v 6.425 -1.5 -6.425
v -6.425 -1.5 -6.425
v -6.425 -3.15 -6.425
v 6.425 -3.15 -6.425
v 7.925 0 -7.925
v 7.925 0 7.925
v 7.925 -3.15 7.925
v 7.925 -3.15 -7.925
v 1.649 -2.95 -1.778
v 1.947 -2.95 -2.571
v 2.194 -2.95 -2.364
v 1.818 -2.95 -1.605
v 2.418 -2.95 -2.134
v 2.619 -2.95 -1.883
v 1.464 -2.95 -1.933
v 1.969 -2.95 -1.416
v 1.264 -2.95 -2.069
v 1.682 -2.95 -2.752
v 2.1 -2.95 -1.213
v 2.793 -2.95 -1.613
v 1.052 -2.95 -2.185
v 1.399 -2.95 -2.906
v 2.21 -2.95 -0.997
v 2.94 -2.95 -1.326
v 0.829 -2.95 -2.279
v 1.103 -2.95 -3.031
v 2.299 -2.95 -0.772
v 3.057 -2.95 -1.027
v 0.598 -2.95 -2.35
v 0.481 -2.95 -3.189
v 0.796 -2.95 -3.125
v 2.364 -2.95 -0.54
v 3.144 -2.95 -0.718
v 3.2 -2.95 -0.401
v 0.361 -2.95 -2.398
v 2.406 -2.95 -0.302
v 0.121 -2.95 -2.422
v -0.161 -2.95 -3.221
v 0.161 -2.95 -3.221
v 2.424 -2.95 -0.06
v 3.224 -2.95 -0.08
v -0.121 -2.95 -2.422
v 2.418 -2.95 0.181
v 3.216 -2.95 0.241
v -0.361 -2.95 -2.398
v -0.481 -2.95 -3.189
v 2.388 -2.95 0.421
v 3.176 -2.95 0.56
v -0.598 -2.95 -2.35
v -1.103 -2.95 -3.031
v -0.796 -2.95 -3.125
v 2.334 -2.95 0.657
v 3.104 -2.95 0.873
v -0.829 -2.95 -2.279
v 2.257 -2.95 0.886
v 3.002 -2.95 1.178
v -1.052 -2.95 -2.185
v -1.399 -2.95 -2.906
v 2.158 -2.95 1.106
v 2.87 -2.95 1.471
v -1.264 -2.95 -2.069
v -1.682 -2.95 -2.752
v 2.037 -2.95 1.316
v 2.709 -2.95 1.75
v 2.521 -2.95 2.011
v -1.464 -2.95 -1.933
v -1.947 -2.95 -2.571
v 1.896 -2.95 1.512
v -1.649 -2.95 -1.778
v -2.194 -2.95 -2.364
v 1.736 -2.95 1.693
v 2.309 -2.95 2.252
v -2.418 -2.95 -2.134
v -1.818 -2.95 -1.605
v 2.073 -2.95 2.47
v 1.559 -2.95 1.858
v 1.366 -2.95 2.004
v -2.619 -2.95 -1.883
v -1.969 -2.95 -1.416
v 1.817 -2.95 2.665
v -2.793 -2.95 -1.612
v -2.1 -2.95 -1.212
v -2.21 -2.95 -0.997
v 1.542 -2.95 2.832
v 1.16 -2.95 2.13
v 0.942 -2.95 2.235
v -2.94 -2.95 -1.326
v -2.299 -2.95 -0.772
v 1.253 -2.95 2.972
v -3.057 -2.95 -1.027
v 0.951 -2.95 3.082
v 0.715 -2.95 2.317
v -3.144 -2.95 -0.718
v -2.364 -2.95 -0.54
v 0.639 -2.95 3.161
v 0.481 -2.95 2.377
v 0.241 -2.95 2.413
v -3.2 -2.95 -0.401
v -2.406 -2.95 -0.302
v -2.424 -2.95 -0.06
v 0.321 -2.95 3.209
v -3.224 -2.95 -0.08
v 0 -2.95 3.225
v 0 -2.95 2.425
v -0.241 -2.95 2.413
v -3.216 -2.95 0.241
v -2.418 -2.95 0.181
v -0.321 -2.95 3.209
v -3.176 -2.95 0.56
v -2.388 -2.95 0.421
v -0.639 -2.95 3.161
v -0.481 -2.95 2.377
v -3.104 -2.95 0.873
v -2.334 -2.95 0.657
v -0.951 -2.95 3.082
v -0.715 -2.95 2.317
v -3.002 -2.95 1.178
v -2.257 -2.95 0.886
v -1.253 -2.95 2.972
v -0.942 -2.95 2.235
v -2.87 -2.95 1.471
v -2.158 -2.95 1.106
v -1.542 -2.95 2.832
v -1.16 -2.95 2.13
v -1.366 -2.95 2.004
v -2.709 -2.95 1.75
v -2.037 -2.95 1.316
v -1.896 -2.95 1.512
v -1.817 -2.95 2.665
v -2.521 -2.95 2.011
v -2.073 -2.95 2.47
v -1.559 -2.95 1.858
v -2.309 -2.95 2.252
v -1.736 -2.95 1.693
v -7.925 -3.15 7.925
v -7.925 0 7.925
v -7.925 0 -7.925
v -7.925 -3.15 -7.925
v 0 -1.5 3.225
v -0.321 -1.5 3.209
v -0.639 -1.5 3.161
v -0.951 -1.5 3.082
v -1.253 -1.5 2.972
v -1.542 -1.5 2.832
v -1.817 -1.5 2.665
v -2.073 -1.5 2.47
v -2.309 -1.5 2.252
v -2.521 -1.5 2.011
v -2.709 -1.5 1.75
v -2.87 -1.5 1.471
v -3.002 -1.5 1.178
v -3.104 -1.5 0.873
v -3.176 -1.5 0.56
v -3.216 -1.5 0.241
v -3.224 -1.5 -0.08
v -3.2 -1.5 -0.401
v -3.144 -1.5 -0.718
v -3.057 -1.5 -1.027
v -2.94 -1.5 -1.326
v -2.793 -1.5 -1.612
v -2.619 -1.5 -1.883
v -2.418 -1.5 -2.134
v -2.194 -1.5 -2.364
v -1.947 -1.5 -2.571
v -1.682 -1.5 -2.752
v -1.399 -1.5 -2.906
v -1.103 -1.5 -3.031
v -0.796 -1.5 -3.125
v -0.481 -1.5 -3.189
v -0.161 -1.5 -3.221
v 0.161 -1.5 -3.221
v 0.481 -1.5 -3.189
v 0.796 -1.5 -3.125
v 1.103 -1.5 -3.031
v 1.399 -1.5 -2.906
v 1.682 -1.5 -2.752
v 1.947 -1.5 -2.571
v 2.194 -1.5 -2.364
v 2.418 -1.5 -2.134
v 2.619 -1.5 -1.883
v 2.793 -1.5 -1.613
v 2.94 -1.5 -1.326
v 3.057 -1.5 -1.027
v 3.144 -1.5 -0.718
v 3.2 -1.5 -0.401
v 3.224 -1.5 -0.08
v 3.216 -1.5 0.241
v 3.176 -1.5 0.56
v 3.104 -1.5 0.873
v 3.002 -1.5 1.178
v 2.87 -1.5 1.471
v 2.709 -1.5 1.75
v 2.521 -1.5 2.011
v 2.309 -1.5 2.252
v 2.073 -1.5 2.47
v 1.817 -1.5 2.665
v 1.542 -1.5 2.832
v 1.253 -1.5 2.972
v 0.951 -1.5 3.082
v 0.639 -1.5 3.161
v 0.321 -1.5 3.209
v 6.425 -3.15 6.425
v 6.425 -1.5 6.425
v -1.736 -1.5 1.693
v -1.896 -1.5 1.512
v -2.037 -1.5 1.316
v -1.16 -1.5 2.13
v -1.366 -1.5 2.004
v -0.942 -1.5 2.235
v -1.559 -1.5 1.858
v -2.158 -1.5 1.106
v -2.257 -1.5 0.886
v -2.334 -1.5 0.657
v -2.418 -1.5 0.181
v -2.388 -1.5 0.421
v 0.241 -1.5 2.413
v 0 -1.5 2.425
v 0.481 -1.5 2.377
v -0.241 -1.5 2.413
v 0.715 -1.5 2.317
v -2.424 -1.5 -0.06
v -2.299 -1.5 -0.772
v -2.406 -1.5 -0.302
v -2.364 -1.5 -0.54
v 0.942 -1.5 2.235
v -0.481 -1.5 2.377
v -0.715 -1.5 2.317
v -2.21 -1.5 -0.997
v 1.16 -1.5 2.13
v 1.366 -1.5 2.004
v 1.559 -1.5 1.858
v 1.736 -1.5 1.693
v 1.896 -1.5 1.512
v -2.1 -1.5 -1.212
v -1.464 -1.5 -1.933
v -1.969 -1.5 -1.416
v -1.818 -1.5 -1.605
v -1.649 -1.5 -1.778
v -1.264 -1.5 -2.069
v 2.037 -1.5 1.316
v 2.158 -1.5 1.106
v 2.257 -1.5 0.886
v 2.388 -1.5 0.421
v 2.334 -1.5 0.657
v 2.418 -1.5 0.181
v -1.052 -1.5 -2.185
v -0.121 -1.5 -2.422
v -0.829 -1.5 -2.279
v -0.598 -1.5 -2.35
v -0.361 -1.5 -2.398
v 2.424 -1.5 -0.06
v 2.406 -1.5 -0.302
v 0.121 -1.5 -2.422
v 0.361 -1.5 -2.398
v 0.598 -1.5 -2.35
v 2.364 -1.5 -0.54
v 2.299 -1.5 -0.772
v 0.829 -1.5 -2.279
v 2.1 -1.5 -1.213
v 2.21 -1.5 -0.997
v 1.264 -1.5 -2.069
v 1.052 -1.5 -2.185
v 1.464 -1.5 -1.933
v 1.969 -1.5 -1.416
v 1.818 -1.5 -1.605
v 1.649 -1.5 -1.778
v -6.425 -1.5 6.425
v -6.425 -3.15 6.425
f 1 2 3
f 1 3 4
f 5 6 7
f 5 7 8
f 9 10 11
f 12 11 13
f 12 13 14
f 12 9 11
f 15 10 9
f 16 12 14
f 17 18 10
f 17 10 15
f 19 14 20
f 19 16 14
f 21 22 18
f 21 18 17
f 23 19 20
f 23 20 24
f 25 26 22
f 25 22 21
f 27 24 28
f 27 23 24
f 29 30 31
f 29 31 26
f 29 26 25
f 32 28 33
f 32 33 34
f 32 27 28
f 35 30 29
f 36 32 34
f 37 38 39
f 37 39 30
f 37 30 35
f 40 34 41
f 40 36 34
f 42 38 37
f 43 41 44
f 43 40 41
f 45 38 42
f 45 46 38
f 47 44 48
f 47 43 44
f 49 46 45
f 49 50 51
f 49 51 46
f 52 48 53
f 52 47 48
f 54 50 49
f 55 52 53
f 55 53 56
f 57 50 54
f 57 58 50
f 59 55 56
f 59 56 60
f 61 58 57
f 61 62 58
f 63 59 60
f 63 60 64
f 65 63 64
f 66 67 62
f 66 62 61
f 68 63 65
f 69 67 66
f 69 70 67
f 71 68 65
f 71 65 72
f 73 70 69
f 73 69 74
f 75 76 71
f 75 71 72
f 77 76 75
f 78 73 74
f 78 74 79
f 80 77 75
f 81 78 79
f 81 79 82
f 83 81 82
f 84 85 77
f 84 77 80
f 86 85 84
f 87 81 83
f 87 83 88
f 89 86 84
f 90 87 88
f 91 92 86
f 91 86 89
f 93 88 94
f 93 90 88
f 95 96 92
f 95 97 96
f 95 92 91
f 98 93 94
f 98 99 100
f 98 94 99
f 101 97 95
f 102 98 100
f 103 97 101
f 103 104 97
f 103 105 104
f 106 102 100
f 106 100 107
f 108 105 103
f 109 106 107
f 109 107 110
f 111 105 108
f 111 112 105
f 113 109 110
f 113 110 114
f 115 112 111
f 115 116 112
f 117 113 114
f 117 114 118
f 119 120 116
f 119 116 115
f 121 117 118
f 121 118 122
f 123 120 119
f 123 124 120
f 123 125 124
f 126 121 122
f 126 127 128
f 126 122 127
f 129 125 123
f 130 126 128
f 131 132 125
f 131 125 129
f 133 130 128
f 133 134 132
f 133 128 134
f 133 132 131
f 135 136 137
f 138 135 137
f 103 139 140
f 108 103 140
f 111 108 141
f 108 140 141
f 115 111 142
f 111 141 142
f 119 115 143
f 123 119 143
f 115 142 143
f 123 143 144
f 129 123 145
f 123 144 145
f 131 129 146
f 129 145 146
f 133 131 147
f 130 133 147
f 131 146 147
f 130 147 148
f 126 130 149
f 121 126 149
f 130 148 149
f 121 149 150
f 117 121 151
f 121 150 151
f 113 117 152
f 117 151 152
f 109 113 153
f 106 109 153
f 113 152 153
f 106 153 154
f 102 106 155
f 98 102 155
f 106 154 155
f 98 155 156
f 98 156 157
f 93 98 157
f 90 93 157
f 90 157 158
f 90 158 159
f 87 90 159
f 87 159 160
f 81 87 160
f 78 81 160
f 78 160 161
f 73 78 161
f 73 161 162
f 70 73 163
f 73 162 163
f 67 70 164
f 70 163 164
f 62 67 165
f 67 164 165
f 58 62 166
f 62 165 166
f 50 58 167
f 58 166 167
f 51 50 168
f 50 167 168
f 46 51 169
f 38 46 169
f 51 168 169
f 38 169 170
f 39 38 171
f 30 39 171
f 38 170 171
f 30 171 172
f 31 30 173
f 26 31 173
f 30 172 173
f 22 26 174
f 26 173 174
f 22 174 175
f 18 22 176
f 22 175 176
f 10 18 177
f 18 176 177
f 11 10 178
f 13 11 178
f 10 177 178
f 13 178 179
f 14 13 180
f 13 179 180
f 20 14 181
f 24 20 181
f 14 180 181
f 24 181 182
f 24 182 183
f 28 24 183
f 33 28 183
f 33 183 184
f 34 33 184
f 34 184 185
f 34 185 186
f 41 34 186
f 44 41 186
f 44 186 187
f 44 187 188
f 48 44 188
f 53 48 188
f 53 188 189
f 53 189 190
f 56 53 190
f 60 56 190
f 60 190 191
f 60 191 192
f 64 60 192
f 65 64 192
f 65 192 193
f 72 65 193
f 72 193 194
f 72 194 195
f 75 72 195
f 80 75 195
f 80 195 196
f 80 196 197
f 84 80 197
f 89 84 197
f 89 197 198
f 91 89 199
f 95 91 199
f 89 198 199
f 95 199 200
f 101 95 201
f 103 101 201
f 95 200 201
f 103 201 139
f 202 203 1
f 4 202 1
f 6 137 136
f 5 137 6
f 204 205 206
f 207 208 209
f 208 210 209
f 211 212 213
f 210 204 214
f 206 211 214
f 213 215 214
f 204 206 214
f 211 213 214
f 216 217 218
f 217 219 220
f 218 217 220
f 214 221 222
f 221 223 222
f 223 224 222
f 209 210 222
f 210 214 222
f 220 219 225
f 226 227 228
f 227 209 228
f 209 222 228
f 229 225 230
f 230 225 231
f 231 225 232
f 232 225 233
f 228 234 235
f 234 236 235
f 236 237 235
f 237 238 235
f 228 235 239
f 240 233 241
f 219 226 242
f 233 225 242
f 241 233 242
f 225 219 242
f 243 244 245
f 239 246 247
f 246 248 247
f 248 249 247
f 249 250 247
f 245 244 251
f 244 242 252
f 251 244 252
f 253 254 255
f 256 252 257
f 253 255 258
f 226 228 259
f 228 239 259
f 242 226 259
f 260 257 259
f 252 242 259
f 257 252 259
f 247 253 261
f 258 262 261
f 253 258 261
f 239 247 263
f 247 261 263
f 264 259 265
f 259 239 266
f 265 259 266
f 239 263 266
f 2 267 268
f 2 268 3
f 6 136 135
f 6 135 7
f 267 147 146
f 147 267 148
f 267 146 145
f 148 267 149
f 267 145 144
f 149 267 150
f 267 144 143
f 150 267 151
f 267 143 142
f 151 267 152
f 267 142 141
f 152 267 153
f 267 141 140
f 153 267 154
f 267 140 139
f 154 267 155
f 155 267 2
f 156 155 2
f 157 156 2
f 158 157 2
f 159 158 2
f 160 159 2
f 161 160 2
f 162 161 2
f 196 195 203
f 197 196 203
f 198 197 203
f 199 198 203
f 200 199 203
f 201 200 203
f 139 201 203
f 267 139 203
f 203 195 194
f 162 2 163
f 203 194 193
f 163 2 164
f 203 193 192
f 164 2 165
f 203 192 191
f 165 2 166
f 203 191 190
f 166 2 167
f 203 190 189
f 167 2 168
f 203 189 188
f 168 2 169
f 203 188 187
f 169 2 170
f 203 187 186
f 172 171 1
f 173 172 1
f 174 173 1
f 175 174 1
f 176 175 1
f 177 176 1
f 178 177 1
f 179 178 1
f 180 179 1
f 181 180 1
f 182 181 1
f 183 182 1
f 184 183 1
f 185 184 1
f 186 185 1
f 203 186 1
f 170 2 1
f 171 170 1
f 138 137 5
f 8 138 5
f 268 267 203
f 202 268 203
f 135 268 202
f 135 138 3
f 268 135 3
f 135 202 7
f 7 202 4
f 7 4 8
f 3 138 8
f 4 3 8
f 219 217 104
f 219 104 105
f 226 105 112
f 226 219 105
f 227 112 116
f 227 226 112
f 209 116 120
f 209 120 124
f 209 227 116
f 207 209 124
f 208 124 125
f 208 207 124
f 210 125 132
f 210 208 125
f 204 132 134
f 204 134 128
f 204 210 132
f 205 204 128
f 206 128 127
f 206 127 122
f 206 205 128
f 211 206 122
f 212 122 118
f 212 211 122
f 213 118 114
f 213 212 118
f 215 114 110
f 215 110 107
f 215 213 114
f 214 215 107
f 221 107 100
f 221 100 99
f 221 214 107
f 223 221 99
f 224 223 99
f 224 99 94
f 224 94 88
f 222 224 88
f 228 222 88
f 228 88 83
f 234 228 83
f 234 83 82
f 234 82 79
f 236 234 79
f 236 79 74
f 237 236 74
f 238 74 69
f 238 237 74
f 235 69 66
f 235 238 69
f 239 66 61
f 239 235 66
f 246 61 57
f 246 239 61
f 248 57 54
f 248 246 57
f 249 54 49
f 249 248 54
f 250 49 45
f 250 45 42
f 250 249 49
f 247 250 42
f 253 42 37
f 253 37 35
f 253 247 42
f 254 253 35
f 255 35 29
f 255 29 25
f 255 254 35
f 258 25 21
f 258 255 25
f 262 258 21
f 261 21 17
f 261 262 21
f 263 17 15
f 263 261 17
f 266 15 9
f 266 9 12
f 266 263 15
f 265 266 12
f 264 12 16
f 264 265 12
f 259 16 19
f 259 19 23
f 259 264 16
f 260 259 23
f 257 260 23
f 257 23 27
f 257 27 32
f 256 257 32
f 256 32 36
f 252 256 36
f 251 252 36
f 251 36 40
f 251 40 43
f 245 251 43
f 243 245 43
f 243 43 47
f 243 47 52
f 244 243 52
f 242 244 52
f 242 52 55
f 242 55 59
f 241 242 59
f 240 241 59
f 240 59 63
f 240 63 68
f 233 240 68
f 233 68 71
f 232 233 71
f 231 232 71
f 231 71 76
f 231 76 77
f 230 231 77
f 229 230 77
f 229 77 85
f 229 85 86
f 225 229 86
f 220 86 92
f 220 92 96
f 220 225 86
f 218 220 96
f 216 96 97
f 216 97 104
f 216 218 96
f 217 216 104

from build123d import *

# Parameters (mm, degrees)
SKETCH1_W           = 15.85
SKETCH1_H           = 15.85
BOSS_EXTRUDE1_DEPTH = 3.15
SHELL1_T            = -1.5
SKETCH2_R           = 3.225
SKETCH2_R_2         = 2.425
BOSS_EXTRUDE2_DEPTH = 1.45


with BuildPart() as part:
    # Sketch1 → Boss-Extrude1 (new body)
    with BuildSketch(Plane(origin=(0, 0, 0), x_dir=(1, 0, 0), z_dir=(0, 1, 0))):
        Rectangle(SKETCH1_W, SKETCH1_H)
    extrude(amount=-BOSS_EXTRUDE1_DEPTH)

    # Shell1
    shell1_openings = [part.faces().sort_by_distance(p)[0] for p in [
        (0, -3.15, 0),
    ]]
    offset(amount=SHELL1_T, openings=shell1_openings, kind=Kind.INTERSECTION)

    # Sketch2 → Boss-Extrude2 (add)
    with BuildSketch(Plane.XZ.offset(1.5)):
        with Locations(Location((0, 0, 0), (0, 0, 90))):
            Circle(SKETCH2_R)
        with Locations(Location((0, 0, 0), (0, 0, 90))):
            Circle(SKETCH2_R_2, mode=Mode.SUBTRACT)
    extrude(amount=BOSS_EXTRUDE2_DEPTH)


solid = part.part
